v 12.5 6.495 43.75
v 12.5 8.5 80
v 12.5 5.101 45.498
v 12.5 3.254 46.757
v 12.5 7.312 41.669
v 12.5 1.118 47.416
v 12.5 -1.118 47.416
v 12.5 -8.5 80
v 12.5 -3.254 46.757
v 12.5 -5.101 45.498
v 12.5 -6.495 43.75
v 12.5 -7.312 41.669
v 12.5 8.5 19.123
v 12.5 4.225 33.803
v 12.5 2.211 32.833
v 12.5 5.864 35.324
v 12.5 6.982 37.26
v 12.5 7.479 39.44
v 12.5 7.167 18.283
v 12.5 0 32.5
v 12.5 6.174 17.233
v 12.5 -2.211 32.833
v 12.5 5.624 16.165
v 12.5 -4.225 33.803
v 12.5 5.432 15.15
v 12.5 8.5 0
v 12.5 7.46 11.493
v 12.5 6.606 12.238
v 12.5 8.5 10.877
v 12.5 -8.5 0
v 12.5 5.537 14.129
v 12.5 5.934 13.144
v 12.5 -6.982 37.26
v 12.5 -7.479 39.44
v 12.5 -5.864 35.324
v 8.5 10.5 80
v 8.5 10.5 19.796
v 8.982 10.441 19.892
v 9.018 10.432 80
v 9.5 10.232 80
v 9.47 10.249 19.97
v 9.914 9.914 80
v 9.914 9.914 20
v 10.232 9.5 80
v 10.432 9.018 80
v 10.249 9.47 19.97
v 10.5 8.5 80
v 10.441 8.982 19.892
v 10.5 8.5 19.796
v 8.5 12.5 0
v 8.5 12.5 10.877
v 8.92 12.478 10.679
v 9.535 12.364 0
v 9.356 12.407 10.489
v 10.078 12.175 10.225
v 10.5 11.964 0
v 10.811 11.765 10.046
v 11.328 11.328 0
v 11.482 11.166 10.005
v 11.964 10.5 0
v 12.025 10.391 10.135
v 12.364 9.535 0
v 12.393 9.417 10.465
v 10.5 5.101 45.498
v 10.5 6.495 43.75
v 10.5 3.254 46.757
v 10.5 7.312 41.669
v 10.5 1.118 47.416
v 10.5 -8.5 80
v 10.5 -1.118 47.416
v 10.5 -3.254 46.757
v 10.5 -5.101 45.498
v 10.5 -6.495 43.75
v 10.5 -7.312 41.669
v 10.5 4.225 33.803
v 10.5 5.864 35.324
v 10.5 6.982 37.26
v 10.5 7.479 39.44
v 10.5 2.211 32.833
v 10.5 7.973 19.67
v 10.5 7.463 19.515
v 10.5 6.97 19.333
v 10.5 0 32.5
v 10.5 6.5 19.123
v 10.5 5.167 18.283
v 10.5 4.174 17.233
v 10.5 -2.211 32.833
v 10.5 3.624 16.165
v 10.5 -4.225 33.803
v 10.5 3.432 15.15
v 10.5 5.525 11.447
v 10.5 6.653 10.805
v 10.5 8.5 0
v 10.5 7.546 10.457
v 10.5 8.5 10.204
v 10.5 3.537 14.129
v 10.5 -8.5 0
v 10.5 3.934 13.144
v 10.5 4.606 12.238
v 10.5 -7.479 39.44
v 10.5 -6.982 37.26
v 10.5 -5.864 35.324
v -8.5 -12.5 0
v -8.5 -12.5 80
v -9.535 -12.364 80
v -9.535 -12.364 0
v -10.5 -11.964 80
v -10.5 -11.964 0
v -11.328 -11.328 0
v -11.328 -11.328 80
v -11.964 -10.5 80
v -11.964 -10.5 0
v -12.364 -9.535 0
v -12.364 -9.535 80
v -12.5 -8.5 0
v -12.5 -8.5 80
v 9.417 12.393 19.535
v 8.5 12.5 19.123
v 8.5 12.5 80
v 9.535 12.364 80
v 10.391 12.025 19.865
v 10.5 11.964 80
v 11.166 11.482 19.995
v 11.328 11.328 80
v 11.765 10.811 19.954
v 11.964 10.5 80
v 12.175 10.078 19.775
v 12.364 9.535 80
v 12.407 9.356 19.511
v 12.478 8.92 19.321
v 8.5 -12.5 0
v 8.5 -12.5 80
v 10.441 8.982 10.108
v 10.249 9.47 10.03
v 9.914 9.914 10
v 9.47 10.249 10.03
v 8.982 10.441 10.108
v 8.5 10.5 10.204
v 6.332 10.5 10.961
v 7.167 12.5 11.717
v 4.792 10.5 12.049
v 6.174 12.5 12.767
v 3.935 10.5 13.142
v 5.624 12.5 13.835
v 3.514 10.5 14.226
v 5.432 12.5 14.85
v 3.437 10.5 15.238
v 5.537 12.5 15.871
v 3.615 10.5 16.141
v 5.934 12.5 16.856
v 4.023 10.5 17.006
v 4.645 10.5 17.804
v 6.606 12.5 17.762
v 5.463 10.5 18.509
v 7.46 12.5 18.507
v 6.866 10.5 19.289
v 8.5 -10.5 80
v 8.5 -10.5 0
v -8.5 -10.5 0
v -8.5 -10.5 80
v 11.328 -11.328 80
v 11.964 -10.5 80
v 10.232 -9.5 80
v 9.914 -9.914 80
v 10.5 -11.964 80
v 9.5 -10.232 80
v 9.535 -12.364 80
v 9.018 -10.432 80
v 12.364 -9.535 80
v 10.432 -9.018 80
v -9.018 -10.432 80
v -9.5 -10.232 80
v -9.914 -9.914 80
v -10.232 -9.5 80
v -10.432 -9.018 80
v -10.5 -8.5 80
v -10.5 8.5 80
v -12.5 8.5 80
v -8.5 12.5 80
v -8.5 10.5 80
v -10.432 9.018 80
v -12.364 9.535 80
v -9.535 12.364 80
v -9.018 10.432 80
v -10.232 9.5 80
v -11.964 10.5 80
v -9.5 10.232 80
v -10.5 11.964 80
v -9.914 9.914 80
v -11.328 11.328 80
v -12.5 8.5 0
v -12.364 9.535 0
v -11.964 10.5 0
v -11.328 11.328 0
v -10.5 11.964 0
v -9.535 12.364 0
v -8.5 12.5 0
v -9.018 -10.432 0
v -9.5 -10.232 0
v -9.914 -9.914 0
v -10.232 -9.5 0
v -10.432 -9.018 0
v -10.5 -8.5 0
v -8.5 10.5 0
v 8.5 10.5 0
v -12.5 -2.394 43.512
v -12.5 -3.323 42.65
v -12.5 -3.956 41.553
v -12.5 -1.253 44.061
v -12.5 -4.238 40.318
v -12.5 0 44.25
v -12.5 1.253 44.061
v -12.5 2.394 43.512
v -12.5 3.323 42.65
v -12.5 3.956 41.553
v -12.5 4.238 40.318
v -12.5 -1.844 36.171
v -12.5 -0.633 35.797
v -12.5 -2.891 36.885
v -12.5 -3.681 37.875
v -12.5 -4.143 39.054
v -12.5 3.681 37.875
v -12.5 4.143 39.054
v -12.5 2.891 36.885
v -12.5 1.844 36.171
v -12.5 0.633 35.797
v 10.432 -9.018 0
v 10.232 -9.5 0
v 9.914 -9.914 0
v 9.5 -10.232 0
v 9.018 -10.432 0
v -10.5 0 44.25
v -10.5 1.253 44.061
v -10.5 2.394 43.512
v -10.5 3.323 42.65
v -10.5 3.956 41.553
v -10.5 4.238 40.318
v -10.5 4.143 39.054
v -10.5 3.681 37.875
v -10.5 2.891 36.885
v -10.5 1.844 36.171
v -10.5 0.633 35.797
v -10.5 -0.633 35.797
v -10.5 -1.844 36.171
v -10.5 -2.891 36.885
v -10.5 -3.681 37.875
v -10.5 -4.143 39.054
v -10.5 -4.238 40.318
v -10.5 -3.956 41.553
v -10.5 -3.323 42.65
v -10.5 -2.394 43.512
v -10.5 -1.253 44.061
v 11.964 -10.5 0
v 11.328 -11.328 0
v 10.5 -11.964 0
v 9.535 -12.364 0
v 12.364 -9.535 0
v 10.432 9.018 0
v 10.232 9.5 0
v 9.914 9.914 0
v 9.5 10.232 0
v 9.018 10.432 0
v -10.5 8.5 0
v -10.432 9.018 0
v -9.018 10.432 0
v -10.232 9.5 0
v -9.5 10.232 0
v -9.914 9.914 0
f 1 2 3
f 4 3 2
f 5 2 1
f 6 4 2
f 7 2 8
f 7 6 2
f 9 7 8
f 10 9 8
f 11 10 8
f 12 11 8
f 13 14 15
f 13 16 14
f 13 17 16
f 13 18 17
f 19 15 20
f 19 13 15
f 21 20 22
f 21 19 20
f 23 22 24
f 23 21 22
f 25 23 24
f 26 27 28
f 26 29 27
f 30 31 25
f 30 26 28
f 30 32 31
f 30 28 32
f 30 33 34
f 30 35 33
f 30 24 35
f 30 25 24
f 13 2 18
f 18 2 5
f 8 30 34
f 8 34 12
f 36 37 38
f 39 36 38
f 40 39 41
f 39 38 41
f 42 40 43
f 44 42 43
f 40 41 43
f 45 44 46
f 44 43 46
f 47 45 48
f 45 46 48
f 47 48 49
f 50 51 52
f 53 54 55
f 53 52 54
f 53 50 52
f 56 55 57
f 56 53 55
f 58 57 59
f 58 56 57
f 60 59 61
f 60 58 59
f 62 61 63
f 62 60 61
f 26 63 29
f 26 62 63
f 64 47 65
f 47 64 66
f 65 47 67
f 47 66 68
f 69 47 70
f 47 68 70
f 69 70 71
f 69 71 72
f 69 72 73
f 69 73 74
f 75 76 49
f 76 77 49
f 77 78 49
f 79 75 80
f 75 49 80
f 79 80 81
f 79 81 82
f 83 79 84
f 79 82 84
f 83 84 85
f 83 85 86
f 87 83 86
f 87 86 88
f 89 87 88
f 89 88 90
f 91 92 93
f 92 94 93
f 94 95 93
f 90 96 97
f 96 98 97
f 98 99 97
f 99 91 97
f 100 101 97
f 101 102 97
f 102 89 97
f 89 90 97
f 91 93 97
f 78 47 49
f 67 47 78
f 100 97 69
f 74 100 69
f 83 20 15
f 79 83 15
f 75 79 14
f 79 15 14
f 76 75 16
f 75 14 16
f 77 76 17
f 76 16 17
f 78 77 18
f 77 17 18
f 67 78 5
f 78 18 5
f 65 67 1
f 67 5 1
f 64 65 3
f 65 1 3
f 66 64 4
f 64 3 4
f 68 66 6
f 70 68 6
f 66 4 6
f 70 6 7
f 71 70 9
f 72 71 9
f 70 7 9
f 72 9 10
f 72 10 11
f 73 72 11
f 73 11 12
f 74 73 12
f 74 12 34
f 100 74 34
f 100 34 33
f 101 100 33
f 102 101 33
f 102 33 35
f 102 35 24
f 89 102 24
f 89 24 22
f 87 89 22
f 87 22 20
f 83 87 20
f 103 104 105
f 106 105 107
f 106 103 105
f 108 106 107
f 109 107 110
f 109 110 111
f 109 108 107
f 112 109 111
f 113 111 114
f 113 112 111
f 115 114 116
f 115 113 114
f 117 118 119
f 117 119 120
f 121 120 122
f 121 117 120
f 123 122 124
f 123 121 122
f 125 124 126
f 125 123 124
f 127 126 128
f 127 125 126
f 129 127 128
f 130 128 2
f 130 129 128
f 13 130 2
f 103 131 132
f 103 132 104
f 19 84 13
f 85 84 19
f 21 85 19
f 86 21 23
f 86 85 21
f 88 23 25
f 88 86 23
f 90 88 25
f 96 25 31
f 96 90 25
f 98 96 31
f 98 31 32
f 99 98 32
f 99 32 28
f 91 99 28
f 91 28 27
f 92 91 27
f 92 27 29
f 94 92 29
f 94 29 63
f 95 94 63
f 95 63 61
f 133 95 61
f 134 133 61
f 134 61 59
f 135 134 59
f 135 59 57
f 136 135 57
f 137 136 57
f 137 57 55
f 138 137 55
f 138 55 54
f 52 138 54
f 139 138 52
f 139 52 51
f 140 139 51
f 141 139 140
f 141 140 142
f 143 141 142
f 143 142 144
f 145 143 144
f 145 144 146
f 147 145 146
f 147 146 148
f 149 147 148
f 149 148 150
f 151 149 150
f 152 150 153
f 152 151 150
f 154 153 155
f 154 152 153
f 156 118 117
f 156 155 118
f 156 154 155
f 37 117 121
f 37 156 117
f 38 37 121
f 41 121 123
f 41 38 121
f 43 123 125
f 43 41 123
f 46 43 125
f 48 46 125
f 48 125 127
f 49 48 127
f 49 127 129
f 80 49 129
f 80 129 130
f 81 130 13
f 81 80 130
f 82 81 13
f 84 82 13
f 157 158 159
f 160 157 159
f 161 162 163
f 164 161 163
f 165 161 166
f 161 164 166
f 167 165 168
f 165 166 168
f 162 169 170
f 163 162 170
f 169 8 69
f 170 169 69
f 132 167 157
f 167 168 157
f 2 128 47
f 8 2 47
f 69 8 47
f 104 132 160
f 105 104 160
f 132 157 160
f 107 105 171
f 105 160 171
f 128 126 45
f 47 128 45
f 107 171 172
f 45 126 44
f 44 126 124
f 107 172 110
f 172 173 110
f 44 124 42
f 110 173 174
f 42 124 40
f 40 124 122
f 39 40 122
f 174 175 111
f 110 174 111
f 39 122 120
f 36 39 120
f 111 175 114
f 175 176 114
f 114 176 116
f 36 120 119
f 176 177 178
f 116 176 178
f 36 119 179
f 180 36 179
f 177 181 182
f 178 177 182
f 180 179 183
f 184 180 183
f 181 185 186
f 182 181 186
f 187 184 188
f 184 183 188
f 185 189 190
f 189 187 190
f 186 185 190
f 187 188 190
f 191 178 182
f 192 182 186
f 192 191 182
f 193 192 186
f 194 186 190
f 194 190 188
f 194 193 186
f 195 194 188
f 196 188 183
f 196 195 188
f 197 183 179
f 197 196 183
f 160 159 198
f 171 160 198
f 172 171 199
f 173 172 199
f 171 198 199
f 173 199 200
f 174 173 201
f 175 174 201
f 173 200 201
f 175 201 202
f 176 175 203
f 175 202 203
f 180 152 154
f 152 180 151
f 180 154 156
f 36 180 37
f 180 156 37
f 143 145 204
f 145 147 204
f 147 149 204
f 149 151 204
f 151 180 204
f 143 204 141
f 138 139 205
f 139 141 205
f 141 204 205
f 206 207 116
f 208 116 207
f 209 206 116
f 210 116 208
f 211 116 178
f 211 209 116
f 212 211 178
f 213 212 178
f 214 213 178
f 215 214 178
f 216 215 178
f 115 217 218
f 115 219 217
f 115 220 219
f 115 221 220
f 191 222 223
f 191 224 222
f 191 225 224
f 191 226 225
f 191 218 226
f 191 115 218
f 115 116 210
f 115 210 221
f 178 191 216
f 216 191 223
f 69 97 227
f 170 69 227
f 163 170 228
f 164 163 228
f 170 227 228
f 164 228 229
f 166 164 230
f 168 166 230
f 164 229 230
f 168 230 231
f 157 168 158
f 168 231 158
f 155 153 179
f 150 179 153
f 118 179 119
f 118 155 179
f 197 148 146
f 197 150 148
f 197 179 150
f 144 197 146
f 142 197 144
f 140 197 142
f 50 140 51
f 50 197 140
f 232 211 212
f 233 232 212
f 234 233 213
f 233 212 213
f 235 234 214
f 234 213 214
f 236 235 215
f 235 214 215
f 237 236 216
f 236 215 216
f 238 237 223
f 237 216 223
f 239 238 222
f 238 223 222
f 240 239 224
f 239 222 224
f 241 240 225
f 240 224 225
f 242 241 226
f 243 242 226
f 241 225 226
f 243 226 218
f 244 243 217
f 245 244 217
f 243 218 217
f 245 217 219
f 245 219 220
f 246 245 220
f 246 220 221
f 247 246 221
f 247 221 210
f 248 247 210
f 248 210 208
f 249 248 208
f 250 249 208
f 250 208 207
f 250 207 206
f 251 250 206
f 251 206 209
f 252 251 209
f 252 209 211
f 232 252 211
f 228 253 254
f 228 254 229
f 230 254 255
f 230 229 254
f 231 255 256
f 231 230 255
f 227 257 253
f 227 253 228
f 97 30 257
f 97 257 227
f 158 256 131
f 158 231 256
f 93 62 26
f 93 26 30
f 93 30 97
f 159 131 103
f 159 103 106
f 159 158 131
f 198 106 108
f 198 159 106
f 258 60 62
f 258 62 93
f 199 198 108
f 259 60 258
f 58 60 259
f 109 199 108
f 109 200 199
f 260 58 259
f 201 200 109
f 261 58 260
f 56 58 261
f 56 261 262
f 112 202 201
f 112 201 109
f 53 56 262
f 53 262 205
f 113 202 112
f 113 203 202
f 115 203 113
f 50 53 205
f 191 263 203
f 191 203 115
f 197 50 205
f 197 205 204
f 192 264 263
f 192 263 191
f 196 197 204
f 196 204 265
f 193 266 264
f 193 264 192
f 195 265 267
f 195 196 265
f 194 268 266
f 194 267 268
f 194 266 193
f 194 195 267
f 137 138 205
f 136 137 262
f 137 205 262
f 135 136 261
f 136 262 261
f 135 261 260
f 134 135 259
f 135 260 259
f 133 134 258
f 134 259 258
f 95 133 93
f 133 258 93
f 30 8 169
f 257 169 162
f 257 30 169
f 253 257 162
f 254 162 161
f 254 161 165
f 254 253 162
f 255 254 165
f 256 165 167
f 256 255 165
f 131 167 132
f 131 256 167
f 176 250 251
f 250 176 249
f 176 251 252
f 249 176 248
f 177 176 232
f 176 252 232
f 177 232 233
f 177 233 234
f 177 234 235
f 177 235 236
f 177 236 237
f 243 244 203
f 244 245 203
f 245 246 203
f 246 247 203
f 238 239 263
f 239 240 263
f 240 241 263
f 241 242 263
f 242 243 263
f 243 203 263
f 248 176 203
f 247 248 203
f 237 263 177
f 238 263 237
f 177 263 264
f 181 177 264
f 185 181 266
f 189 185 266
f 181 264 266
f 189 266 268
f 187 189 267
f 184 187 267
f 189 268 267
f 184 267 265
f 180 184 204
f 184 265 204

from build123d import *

# Parameters (mm, degrees)
EXTRUDE_1_DEPTH     = 80
SKETCH_2_R          = 7.5
CUT_EXTRUDE_1_DEPTH = 3
SKETCH_3_R          = 4.25
CUT_EXTRUDE_2_DEPTH = 3
SKETCH_4_R          = 5
CUT_EXTRUDE_3_DEPTH = 20


with BuildPart() as part:
    # Эскиз1 → Бобышка-Вытянуть1 (new body)
    with BuildSketch(Plane.XY):
        with BuildLine():
            Line((8.5, -12.5), (-8.5, -12.5))
            ThreePointArc((-8.5, -12.5), (-11.328427125, -11.328427125), (-12.5, -8.5))
            Line((-12.5, -8.5), (-12.5, 8.5))
            ThreePointArc((-12.5, 8.5), (-11.328427125, 11.328427125), (-8.5, 12.5))
            Line((-8.5, 12.5), (8.5, 12.5))
            ThreePointArc((8.5, 12.5), (11.328427125, 11.328427125), (12.5, 8.5))
            Line((12.5, 8.5), (12.5, -8.5))
            ThreePointArc((12.5, -8.5), (11.328427125, -11.328427125), (8.5, -12.5))
        make_face()
        with BuildLine():
            Line((-10.5, -8.5), (-10.5, 8.5))
            ThreePointArc((-10.5, 8.5), (-9.914213562, 9.914213562), (-8.5, 10.5))
            Line((-8.5, 10.5), (8.5, 10.5))
            ThreePointArc((8.5, 10.5), (9.914213562, 9.914213562), (10.5, 8.5))
            Line((10.5, 8.5), (10.5, -8.5))
            ThreePointArc((10.5, -8.5), (9.914213562, -9.914213562), (8.5, -10.5))
            Line((8.5, -10.5), (-8.5, -10.5))
            ThreePointArc((-8.5, -10.5), (-9.914213562, -9.914213562), (-10.5, -8.5))
        make_face(mode=Mode.SUBTRACT)
    extrude(amount=EXTRUDE_1_DEPTH)

    # Эскиз2 → Вырез-Вытянуть1 (cut)
    with BuildSketch(Plane(origin=(12.5, 0, 0), x_dir=(0, 0, -1), z_dir=(1, 0, 0))):
        with Locations((-40, 0)):
            Circle(SKETCH_2_R)
    extrude(amount=-CUT_EXTRUDE_1_DEPTH, mode=Mode.SUBTRACT)

    # Эскиз3 → Вырез-Вытянуть2 (cut)
    with BuildSketch(Plane.ZY.offset(12.5)):
        with Locations((40, 0)):
            Circle(SKETCH_3_R)
    extrude(amount=-CUT_EXTRUDE_2_DEPTH, mode=Mode.SUBTRACT)

    # Эскиз4 → Вырез-Вытянуть3 (cut)
    with BuildSketch(Plane(origin=(0, 0, 0), x_dir=(0, 0, -1), z_dir=(0.7071067811865488, 0.7071067811865464, 0))):
        with Locations((-15, 0)):
            Circle(SKETCH_4_R)
    extrude(amount=CUT_EXTRUDE_3_DEPTH, mode=Mode.SUBTRACT)


solid = part.part
